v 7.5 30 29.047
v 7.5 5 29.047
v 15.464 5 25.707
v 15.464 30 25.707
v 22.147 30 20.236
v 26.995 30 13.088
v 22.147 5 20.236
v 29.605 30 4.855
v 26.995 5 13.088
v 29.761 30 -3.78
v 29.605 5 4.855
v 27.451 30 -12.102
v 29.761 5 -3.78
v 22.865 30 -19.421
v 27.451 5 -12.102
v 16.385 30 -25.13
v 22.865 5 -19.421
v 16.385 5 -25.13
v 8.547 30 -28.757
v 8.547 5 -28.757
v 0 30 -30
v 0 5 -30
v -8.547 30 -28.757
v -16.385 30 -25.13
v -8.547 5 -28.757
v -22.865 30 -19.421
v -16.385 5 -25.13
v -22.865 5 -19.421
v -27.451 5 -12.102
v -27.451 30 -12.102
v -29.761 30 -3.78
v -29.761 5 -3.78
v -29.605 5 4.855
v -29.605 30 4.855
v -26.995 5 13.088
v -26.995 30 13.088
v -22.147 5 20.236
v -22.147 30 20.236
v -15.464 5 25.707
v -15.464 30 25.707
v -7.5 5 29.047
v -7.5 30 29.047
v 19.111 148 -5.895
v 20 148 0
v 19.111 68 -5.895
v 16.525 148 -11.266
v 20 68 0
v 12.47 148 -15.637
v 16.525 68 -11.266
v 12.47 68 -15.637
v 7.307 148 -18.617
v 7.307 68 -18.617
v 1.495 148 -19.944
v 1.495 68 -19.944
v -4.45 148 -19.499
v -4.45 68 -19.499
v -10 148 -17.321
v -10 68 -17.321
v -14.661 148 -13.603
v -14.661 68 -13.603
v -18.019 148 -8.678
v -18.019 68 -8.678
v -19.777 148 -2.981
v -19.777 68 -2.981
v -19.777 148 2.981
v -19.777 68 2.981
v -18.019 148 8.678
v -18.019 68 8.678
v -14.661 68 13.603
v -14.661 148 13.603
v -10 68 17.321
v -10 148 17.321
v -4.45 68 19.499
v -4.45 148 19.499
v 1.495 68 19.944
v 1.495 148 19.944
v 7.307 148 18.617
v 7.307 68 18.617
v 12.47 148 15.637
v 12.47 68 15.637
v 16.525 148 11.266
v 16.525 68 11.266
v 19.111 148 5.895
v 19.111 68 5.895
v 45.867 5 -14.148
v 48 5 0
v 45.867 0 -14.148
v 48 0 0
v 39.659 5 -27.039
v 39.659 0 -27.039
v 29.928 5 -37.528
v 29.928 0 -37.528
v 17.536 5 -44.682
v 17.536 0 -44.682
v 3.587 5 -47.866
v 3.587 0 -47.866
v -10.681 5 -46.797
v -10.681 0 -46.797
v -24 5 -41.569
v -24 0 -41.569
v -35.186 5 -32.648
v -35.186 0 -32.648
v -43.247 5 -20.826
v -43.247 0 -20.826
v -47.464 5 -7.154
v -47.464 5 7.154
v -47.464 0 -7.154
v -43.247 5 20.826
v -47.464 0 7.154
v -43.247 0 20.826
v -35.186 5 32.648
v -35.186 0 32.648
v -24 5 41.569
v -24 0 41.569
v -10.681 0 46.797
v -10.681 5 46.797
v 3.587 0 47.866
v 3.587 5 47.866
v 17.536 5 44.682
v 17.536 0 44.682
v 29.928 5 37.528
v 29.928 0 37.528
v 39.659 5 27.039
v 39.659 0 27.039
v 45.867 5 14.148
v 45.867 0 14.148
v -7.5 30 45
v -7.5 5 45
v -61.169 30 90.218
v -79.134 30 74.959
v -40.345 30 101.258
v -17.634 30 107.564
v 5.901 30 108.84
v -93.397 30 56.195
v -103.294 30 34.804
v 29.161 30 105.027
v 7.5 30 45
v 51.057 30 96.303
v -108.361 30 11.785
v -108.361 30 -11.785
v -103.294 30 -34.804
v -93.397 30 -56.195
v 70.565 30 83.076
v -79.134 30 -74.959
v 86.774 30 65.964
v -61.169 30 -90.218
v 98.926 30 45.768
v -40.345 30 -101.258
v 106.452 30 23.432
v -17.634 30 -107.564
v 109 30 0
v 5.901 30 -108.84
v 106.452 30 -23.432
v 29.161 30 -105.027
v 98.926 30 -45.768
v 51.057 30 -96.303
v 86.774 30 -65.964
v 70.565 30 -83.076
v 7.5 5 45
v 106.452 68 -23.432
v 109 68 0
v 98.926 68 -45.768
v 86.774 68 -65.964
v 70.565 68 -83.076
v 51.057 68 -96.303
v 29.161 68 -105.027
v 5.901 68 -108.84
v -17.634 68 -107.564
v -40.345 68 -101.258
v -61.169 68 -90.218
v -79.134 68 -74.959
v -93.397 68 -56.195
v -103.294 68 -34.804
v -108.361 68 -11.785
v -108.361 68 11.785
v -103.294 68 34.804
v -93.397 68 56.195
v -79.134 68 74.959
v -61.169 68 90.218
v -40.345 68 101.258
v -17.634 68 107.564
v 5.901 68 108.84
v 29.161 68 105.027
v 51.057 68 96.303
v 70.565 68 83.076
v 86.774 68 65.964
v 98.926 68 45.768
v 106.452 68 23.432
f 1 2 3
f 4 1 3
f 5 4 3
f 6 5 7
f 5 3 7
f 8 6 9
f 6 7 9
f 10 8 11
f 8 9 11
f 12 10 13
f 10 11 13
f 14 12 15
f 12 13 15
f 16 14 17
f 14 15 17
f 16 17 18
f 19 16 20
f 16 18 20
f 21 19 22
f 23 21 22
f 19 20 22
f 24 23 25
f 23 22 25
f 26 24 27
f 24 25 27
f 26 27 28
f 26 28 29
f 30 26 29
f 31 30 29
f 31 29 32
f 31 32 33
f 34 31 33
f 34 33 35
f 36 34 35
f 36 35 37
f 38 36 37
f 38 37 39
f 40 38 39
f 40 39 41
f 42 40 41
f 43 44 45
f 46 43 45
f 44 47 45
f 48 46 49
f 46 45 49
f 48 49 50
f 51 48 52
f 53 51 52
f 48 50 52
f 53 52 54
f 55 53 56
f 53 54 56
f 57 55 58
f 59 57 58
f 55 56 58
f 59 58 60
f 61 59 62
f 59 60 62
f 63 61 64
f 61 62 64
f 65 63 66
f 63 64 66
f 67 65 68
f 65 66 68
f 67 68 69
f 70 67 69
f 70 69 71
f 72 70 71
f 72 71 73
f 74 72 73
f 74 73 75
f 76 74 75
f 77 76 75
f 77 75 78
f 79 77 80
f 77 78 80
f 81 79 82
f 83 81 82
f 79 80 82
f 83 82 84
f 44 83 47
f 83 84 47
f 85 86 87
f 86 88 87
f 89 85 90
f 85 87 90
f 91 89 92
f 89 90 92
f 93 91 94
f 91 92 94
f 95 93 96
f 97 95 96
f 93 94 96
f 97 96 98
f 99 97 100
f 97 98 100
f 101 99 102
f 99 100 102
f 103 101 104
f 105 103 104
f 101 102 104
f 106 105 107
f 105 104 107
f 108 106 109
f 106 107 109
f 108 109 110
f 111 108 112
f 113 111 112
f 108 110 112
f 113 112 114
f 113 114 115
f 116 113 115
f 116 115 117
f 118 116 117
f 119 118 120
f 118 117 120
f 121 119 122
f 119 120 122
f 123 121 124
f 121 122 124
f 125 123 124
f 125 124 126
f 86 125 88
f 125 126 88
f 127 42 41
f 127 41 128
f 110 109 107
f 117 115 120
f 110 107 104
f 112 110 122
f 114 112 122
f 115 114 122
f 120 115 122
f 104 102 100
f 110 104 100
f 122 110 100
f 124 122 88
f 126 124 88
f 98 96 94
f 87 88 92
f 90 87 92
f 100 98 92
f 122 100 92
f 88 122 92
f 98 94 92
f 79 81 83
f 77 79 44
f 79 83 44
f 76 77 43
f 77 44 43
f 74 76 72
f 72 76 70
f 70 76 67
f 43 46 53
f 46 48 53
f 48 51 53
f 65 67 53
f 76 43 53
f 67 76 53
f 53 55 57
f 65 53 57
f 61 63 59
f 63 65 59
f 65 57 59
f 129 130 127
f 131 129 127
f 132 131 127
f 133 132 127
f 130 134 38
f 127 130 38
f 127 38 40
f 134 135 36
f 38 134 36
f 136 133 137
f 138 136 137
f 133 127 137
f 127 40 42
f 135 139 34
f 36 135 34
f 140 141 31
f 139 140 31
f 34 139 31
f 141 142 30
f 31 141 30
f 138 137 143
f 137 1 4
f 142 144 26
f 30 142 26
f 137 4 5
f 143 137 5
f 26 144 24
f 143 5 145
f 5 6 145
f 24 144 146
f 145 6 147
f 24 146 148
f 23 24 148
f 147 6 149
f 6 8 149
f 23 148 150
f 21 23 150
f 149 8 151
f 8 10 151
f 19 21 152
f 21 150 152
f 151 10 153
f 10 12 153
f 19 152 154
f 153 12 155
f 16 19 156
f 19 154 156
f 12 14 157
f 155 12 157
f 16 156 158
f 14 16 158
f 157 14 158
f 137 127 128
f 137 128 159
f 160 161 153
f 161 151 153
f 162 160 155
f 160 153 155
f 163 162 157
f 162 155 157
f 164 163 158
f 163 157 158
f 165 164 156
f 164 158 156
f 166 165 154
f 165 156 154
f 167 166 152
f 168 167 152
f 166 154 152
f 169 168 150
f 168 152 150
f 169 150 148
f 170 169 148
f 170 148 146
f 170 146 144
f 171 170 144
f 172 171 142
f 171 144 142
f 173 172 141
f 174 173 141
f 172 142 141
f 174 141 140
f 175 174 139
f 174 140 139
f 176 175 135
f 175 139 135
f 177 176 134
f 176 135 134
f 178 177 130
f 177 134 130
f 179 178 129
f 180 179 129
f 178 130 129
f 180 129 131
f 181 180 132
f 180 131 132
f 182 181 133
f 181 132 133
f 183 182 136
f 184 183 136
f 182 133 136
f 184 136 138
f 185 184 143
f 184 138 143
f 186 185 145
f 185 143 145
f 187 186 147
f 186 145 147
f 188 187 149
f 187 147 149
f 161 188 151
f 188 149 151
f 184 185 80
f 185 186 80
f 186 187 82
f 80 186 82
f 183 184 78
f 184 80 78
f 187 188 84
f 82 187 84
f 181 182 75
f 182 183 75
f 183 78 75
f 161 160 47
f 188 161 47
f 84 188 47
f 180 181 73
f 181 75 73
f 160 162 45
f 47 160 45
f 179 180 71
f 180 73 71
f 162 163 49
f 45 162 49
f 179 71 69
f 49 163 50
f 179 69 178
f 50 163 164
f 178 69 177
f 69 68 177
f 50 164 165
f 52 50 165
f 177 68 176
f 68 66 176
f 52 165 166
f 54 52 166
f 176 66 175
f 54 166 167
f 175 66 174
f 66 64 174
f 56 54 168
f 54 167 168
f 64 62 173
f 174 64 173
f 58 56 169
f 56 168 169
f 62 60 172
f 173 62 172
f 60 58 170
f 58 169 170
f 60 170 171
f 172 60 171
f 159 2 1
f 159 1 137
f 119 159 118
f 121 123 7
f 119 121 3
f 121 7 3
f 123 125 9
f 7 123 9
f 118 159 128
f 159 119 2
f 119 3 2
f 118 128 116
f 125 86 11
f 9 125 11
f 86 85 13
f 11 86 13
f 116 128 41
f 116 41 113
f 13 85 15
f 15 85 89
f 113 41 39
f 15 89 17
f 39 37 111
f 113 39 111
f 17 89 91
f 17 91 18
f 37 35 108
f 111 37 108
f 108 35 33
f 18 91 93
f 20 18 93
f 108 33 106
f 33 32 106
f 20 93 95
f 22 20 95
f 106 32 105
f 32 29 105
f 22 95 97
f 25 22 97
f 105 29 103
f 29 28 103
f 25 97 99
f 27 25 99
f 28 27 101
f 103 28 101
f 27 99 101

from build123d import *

# Parameters (mm, degrees)
SCHIZZO3_W                   = 15
SCHIZZO3_H                   = 45
ESTRUSIONE_ESTRUSIONE1_DEPTH = 25


with BuildPart() as part:
    # Schizzo1 → Rivoluzione1 (revolve)
    with BuildSketch(Plane.XY):
        Polygon((20, 68), (109, 68), (109, 30), (30, 30), (30, 5), (48, 5), (48, 0), (0, 0), (0, 148), (20, 148), align=None)
    revolve(axis=Axis((0, -1000, 0), (0, 1, 0)))

    # Schizzo3 → Estrusione-Estrusione1 (add)
    with BuildSketch(Plane.XZ.offset(-30)):
        with Locations((0, 22.5)):
            Rectangle(SCHIZZO3_W, SCHIZZO3_H)
    extrude(amount=ESTRUSIONE_ESTRUSIONE1_DEPTH)


solid = part.part
